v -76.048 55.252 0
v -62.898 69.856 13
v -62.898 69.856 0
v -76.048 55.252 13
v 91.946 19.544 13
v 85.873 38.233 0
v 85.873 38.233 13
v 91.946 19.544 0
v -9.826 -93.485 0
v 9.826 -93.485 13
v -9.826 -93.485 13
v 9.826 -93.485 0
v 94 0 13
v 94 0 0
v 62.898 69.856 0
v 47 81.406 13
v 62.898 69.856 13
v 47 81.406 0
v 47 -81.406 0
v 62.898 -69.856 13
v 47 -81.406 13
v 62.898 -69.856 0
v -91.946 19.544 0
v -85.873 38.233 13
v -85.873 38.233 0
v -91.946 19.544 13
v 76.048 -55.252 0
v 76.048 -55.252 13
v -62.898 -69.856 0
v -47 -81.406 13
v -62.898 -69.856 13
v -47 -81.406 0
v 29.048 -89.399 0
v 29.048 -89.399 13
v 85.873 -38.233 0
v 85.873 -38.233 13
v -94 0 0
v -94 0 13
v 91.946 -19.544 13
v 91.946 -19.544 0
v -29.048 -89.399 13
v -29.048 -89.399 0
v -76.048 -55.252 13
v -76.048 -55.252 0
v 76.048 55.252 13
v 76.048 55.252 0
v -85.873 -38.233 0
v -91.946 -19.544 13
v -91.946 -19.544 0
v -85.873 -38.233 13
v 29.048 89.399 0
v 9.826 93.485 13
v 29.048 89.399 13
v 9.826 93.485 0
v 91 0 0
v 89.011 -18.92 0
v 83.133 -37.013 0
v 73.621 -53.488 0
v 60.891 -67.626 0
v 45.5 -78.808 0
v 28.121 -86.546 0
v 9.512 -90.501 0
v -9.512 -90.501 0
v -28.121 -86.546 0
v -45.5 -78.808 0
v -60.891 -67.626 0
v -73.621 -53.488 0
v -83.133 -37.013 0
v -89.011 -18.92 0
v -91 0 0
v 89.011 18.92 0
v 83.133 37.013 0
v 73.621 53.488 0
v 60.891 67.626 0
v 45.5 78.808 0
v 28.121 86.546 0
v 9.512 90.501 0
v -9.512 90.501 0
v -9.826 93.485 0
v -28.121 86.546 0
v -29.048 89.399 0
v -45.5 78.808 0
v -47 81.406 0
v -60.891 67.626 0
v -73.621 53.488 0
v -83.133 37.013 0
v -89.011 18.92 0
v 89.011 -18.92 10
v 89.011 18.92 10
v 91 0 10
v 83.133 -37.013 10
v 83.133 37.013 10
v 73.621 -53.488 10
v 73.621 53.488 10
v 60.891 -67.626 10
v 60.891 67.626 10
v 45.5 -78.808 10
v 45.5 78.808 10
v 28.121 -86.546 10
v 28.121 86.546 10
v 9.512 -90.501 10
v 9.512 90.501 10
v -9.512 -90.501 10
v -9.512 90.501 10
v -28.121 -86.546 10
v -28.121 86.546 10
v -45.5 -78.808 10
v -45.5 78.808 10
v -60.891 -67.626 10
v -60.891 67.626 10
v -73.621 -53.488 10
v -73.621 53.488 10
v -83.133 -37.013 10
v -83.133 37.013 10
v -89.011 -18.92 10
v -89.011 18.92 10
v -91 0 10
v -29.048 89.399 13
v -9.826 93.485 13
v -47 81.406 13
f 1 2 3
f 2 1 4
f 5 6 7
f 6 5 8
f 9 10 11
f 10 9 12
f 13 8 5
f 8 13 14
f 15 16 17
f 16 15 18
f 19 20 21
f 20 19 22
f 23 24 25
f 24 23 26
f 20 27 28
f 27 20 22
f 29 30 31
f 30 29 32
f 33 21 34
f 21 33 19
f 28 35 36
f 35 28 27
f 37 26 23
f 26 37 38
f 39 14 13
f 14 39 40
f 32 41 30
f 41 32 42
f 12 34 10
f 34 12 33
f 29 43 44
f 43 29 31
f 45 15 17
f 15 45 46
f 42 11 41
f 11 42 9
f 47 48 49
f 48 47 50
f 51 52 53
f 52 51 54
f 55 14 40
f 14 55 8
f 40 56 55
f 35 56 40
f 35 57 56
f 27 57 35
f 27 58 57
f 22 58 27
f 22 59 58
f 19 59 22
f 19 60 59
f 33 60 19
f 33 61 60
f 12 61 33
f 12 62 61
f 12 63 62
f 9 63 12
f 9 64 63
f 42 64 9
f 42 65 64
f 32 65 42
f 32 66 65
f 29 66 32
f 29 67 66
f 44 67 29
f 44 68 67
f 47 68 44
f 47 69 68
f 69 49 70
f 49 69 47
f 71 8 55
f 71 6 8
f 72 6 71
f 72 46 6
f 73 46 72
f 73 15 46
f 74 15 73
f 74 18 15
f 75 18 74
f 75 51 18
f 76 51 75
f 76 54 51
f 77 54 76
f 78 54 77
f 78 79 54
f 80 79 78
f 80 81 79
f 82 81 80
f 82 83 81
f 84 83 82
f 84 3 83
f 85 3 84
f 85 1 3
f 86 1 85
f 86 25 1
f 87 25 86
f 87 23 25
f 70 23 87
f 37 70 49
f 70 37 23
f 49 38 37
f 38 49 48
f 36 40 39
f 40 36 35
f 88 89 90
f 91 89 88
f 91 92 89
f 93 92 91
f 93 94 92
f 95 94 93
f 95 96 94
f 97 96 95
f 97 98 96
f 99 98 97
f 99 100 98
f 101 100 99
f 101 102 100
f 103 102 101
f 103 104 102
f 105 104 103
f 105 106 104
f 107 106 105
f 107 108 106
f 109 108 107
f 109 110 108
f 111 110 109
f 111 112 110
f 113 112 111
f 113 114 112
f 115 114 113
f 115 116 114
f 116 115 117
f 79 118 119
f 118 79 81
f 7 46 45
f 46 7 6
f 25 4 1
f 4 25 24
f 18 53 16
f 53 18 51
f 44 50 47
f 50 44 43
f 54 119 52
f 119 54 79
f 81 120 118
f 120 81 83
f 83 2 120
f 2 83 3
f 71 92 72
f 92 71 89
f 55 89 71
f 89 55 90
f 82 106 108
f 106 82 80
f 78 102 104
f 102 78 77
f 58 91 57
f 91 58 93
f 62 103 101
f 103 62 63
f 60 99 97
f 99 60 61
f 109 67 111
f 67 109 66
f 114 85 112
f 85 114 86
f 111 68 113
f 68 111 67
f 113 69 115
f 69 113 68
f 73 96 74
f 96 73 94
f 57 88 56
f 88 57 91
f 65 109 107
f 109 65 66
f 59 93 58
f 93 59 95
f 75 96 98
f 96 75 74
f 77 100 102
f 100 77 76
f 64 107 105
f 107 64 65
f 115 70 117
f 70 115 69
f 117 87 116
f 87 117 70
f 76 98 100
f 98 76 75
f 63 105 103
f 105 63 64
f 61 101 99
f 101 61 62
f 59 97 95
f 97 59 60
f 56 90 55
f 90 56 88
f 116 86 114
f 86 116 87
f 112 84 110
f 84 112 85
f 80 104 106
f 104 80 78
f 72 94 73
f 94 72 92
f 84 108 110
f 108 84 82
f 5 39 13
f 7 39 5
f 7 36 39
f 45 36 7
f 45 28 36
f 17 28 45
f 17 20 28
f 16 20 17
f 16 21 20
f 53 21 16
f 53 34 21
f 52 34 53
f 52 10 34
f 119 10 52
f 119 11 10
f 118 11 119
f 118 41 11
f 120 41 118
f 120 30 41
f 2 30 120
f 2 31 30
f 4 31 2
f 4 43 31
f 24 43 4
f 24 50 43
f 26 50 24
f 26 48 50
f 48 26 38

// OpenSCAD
translate([0,0,10]) linear_extrude(3) circle (94);
difference(){
linear_extrude(10) circle (94);
linear_extrude(10) circle (91);}
